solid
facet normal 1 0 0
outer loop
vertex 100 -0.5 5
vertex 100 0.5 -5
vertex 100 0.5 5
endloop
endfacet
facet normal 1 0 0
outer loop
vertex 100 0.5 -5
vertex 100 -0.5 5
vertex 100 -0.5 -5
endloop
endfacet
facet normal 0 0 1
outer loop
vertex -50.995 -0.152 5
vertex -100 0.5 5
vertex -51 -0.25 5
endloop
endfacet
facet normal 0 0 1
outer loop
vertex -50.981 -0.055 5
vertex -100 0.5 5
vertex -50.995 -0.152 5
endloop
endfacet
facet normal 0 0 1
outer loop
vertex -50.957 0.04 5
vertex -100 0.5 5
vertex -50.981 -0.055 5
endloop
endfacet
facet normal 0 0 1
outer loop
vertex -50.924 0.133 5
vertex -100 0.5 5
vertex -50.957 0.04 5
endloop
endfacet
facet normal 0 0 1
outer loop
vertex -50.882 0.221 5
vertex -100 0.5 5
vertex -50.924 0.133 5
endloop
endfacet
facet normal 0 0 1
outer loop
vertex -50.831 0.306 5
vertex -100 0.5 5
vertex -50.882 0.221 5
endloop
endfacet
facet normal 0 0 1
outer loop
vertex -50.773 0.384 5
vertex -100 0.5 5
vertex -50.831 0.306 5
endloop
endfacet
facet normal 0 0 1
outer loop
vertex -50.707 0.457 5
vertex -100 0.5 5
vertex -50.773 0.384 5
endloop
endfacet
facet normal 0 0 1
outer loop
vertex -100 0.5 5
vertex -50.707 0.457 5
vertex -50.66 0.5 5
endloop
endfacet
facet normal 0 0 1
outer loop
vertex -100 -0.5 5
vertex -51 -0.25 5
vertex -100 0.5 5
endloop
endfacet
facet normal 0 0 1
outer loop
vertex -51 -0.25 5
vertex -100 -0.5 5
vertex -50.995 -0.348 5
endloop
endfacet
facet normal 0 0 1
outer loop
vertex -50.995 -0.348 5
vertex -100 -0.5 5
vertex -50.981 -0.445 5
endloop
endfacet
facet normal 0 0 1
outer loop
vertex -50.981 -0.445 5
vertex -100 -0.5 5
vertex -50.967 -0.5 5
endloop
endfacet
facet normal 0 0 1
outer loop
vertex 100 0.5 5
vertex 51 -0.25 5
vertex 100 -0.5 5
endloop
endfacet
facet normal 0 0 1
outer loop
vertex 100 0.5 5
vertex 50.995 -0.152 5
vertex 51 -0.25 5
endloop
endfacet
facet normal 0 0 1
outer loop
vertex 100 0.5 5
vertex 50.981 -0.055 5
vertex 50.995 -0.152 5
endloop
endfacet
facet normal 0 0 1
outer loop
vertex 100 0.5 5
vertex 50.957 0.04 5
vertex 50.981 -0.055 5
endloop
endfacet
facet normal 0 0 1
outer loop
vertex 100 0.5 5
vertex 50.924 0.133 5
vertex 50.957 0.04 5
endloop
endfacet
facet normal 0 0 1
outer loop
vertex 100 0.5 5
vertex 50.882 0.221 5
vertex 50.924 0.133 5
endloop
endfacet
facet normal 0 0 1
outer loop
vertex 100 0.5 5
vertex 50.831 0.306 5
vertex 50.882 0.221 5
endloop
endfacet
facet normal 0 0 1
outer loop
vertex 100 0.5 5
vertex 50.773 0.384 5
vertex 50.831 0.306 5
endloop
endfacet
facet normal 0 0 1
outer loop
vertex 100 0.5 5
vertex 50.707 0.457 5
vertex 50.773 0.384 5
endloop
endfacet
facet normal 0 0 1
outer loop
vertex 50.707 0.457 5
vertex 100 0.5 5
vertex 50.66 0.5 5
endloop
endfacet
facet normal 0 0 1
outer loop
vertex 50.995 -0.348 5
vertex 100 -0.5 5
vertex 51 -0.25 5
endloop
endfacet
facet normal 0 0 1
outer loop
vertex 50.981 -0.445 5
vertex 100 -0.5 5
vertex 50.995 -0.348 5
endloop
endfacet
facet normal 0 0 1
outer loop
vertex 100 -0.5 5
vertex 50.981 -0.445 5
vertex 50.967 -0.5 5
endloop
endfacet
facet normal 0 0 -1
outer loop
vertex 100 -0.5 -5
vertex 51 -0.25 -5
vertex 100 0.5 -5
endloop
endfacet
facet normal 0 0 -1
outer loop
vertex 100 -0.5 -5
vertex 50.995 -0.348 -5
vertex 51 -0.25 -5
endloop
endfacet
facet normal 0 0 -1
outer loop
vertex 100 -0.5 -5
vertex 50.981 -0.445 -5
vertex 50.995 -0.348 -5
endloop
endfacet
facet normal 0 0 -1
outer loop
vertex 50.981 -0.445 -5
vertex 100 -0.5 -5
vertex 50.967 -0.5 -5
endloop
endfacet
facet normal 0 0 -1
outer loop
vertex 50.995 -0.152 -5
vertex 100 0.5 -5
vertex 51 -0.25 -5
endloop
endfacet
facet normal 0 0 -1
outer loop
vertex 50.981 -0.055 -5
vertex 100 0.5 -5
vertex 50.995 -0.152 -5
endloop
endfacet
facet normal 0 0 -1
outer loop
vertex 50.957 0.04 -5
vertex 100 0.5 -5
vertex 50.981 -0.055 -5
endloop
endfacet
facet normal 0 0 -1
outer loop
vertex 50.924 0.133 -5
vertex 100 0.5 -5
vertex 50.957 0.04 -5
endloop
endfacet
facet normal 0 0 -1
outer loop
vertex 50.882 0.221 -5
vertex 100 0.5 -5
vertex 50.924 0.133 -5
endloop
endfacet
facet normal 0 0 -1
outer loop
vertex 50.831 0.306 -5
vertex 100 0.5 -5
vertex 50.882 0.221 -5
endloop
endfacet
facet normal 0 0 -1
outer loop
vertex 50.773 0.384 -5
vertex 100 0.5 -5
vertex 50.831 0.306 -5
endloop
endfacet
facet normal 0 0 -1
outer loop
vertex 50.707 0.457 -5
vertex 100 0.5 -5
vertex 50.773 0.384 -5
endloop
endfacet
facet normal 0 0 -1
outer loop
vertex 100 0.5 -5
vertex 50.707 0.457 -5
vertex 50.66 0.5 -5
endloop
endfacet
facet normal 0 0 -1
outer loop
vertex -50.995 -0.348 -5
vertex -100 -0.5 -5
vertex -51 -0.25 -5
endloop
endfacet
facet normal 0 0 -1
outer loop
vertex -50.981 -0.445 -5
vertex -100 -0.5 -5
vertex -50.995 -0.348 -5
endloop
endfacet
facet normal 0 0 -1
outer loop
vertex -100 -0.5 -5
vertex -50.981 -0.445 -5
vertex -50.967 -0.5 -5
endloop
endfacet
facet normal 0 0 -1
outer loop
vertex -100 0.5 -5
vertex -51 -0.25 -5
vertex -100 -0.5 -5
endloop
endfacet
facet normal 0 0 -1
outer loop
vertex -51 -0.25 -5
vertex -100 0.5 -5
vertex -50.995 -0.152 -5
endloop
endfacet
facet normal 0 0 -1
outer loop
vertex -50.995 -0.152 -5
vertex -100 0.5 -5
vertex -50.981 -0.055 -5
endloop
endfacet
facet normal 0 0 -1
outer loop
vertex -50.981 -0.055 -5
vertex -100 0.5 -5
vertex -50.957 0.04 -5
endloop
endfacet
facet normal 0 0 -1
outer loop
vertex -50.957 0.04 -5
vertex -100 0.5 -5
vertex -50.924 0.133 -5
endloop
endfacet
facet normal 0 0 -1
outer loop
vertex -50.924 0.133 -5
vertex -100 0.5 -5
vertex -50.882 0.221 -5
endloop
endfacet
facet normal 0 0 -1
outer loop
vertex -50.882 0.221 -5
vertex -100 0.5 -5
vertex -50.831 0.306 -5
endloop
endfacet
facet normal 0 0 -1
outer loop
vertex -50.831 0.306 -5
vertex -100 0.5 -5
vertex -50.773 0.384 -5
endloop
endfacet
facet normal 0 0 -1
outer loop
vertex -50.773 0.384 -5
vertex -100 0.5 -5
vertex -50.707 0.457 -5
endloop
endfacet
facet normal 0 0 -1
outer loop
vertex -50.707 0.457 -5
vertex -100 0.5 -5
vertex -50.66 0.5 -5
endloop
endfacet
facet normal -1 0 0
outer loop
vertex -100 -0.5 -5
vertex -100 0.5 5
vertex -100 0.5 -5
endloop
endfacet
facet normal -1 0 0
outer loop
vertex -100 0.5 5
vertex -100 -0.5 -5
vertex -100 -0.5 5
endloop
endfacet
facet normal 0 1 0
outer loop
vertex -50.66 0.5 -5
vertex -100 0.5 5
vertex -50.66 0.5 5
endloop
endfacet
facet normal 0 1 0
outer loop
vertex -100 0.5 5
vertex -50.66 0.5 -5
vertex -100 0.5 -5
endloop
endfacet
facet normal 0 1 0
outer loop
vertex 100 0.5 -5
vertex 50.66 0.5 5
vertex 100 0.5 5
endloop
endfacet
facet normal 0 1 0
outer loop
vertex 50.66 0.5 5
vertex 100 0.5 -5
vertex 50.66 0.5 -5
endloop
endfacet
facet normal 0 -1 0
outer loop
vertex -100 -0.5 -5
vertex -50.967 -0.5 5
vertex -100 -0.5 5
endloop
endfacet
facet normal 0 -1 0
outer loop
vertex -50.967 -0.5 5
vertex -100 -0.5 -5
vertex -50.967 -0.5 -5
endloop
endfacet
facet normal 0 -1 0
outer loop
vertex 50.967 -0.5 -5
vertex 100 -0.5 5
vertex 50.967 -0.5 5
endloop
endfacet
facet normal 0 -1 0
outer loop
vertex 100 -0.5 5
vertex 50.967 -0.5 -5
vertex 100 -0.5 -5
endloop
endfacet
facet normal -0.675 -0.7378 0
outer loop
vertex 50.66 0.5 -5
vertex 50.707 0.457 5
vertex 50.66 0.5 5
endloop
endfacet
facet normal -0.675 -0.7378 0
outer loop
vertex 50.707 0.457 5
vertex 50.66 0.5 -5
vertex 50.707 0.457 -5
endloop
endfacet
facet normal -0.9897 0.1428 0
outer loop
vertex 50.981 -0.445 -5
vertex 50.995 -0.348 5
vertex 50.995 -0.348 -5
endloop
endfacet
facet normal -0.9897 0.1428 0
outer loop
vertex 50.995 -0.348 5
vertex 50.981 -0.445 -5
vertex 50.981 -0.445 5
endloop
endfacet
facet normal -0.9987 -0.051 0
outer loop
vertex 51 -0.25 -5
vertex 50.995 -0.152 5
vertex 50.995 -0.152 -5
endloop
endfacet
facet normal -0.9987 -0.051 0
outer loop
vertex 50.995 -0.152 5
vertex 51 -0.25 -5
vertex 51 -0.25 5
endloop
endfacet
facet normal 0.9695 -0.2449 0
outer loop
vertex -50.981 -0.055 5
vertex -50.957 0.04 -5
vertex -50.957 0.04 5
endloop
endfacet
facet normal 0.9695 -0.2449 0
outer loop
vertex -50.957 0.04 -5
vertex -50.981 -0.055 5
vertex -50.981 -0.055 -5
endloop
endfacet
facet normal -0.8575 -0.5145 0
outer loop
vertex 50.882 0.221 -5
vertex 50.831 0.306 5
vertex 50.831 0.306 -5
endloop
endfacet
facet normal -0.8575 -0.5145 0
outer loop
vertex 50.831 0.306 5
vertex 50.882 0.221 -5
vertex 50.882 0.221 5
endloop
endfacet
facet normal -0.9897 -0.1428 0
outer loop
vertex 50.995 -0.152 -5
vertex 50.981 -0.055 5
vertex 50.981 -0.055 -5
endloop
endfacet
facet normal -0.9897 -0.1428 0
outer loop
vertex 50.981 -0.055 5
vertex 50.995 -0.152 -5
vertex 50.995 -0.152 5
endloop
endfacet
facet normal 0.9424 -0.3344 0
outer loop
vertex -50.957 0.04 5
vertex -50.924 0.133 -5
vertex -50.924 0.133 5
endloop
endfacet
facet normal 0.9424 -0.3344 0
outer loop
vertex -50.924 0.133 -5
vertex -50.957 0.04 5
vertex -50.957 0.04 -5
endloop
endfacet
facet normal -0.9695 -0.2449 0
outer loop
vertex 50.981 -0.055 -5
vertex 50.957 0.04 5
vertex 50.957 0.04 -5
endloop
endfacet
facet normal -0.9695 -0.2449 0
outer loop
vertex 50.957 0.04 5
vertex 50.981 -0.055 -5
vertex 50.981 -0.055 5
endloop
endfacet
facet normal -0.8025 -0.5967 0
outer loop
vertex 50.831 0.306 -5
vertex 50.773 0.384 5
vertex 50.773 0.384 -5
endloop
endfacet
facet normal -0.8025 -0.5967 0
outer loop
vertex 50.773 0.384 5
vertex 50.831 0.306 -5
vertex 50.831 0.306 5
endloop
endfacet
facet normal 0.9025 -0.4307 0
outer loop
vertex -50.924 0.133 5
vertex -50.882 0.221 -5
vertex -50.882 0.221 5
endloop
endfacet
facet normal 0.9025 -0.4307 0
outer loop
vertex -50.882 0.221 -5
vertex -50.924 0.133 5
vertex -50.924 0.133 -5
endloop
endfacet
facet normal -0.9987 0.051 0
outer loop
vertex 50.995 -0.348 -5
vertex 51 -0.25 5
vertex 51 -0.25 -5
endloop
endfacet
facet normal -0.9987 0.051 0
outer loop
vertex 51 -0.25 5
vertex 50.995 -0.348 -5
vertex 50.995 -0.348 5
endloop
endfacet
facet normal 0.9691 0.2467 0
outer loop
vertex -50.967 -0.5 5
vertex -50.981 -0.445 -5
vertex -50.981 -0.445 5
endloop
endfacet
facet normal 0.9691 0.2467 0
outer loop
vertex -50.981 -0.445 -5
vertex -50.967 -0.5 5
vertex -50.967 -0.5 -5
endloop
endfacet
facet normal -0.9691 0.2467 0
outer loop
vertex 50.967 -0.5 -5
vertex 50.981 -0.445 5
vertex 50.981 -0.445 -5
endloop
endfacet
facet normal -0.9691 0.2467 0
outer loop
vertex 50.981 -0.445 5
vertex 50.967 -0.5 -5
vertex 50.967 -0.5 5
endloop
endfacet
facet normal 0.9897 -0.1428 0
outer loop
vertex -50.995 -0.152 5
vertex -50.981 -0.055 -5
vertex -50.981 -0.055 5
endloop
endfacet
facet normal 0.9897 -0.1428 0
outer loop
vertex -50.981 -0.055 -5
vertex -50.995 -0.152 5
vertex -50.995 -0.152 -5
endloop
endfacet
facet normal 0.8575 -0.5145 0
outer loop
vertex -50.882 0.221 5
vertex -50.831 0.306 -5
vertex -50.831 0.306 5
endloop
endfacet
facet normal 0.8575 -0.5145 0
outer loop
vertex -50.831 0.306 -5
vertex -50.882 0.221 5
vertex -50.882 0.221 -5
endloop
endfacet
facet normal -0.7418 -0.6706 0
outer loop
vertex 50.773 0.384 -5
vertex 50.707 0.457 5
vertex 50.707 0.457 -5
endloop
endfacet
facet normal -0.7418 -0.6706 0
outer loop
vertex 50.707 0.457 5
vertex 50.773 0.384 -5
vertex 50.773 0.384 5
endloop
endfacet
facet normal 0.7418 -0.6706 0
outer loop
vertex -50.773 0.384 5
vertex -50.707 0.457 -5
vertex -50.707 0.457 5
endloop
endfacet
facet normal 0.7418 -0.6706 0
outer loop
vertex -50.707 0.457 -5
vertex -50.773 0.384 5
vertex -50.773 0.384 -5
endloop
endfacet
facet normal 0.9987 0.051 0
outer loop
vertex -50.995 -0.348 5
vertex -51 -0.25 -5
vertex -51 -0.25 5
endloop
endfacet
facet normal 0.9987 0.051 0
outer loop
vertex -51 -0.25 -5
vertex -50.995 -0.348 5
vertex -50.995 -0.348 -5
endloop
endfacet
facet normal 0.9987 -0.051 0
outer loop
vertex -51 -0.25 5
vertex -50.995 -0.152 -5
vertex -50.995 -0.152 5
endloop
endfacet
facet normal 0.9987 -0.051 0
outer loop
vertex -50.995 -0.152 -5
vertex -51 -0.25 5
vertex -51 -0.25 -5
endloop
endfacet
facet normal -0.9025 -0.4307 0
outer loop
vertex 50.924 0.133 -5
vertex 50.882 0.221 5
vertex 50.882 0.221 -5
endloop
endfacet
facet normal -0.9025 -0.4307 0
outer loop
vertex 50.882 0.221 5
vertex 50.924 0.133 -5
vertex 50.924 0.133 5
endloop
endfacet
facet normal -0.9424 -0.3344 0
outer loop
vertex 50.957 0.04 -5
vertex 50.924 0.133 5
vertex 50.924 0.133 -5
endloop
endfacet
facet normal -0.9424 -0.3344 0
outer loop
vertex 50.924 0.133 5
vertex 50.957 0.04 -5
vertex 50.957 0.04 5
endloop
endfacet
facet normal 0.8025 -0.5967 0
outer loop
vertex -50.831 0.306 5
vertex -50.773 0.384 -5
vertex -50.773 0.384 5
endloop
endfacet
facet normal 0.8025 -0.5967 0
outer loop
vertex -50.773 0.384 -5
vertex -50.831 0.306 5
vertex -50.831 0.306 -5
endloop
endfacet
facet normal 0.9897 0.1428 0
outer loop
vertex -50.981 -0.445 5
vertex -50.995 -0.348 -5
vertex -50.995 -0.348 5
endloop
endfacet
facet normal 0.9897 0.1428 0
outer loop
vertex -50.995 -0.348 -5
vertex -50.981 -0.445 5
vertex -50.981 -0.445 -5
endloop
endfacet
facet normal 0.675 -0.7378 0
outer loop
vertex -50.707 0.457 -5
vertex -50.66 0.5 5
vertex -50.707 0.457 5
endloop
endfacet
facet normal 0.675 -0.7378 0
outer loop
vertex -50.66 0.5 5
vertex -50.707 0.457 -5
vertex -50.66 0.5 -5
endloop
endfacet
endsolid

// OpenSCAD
module rail_beam() {
    difference() {
        // Main beam
        translate([-100, -0.5, -5])
        cube([200, 1, 10]);

        // Central elongated rounded-rectangle slot
        translate([-50, -0.25, -5.5])
        hull() {
            translate([0, 0, 0])
            cylinder(h=11, r=1, $fn=64);
            translate([100, 0, 0])
            cylinder(h=11, r=1, $fn=64);
        }

        // Four diamond-shaped through-holes
        for (x = [-80, 80]) {
            for (y = [-0.25, 0.25]) {
                translate([x, y, -5.5])
                rotate([0, 0, 45])
                square([2, 2]);
            }
        }

        // Tapered/triangular web with lightening cutouts
        for (x = [-90, 90]) {
            translate([x, -0.5, -5])
            rotate([0, 0, 45])
            difference() {
                square([20, 20]);
                translate([2, 2])
                square([16, 16]);
            }
        }

        // Small central diamond cutout
        translate([-1, -0.5, -5])
        rotate([0, 0, 45])
        square([2, 2]);
    }
}

rail_beam();
